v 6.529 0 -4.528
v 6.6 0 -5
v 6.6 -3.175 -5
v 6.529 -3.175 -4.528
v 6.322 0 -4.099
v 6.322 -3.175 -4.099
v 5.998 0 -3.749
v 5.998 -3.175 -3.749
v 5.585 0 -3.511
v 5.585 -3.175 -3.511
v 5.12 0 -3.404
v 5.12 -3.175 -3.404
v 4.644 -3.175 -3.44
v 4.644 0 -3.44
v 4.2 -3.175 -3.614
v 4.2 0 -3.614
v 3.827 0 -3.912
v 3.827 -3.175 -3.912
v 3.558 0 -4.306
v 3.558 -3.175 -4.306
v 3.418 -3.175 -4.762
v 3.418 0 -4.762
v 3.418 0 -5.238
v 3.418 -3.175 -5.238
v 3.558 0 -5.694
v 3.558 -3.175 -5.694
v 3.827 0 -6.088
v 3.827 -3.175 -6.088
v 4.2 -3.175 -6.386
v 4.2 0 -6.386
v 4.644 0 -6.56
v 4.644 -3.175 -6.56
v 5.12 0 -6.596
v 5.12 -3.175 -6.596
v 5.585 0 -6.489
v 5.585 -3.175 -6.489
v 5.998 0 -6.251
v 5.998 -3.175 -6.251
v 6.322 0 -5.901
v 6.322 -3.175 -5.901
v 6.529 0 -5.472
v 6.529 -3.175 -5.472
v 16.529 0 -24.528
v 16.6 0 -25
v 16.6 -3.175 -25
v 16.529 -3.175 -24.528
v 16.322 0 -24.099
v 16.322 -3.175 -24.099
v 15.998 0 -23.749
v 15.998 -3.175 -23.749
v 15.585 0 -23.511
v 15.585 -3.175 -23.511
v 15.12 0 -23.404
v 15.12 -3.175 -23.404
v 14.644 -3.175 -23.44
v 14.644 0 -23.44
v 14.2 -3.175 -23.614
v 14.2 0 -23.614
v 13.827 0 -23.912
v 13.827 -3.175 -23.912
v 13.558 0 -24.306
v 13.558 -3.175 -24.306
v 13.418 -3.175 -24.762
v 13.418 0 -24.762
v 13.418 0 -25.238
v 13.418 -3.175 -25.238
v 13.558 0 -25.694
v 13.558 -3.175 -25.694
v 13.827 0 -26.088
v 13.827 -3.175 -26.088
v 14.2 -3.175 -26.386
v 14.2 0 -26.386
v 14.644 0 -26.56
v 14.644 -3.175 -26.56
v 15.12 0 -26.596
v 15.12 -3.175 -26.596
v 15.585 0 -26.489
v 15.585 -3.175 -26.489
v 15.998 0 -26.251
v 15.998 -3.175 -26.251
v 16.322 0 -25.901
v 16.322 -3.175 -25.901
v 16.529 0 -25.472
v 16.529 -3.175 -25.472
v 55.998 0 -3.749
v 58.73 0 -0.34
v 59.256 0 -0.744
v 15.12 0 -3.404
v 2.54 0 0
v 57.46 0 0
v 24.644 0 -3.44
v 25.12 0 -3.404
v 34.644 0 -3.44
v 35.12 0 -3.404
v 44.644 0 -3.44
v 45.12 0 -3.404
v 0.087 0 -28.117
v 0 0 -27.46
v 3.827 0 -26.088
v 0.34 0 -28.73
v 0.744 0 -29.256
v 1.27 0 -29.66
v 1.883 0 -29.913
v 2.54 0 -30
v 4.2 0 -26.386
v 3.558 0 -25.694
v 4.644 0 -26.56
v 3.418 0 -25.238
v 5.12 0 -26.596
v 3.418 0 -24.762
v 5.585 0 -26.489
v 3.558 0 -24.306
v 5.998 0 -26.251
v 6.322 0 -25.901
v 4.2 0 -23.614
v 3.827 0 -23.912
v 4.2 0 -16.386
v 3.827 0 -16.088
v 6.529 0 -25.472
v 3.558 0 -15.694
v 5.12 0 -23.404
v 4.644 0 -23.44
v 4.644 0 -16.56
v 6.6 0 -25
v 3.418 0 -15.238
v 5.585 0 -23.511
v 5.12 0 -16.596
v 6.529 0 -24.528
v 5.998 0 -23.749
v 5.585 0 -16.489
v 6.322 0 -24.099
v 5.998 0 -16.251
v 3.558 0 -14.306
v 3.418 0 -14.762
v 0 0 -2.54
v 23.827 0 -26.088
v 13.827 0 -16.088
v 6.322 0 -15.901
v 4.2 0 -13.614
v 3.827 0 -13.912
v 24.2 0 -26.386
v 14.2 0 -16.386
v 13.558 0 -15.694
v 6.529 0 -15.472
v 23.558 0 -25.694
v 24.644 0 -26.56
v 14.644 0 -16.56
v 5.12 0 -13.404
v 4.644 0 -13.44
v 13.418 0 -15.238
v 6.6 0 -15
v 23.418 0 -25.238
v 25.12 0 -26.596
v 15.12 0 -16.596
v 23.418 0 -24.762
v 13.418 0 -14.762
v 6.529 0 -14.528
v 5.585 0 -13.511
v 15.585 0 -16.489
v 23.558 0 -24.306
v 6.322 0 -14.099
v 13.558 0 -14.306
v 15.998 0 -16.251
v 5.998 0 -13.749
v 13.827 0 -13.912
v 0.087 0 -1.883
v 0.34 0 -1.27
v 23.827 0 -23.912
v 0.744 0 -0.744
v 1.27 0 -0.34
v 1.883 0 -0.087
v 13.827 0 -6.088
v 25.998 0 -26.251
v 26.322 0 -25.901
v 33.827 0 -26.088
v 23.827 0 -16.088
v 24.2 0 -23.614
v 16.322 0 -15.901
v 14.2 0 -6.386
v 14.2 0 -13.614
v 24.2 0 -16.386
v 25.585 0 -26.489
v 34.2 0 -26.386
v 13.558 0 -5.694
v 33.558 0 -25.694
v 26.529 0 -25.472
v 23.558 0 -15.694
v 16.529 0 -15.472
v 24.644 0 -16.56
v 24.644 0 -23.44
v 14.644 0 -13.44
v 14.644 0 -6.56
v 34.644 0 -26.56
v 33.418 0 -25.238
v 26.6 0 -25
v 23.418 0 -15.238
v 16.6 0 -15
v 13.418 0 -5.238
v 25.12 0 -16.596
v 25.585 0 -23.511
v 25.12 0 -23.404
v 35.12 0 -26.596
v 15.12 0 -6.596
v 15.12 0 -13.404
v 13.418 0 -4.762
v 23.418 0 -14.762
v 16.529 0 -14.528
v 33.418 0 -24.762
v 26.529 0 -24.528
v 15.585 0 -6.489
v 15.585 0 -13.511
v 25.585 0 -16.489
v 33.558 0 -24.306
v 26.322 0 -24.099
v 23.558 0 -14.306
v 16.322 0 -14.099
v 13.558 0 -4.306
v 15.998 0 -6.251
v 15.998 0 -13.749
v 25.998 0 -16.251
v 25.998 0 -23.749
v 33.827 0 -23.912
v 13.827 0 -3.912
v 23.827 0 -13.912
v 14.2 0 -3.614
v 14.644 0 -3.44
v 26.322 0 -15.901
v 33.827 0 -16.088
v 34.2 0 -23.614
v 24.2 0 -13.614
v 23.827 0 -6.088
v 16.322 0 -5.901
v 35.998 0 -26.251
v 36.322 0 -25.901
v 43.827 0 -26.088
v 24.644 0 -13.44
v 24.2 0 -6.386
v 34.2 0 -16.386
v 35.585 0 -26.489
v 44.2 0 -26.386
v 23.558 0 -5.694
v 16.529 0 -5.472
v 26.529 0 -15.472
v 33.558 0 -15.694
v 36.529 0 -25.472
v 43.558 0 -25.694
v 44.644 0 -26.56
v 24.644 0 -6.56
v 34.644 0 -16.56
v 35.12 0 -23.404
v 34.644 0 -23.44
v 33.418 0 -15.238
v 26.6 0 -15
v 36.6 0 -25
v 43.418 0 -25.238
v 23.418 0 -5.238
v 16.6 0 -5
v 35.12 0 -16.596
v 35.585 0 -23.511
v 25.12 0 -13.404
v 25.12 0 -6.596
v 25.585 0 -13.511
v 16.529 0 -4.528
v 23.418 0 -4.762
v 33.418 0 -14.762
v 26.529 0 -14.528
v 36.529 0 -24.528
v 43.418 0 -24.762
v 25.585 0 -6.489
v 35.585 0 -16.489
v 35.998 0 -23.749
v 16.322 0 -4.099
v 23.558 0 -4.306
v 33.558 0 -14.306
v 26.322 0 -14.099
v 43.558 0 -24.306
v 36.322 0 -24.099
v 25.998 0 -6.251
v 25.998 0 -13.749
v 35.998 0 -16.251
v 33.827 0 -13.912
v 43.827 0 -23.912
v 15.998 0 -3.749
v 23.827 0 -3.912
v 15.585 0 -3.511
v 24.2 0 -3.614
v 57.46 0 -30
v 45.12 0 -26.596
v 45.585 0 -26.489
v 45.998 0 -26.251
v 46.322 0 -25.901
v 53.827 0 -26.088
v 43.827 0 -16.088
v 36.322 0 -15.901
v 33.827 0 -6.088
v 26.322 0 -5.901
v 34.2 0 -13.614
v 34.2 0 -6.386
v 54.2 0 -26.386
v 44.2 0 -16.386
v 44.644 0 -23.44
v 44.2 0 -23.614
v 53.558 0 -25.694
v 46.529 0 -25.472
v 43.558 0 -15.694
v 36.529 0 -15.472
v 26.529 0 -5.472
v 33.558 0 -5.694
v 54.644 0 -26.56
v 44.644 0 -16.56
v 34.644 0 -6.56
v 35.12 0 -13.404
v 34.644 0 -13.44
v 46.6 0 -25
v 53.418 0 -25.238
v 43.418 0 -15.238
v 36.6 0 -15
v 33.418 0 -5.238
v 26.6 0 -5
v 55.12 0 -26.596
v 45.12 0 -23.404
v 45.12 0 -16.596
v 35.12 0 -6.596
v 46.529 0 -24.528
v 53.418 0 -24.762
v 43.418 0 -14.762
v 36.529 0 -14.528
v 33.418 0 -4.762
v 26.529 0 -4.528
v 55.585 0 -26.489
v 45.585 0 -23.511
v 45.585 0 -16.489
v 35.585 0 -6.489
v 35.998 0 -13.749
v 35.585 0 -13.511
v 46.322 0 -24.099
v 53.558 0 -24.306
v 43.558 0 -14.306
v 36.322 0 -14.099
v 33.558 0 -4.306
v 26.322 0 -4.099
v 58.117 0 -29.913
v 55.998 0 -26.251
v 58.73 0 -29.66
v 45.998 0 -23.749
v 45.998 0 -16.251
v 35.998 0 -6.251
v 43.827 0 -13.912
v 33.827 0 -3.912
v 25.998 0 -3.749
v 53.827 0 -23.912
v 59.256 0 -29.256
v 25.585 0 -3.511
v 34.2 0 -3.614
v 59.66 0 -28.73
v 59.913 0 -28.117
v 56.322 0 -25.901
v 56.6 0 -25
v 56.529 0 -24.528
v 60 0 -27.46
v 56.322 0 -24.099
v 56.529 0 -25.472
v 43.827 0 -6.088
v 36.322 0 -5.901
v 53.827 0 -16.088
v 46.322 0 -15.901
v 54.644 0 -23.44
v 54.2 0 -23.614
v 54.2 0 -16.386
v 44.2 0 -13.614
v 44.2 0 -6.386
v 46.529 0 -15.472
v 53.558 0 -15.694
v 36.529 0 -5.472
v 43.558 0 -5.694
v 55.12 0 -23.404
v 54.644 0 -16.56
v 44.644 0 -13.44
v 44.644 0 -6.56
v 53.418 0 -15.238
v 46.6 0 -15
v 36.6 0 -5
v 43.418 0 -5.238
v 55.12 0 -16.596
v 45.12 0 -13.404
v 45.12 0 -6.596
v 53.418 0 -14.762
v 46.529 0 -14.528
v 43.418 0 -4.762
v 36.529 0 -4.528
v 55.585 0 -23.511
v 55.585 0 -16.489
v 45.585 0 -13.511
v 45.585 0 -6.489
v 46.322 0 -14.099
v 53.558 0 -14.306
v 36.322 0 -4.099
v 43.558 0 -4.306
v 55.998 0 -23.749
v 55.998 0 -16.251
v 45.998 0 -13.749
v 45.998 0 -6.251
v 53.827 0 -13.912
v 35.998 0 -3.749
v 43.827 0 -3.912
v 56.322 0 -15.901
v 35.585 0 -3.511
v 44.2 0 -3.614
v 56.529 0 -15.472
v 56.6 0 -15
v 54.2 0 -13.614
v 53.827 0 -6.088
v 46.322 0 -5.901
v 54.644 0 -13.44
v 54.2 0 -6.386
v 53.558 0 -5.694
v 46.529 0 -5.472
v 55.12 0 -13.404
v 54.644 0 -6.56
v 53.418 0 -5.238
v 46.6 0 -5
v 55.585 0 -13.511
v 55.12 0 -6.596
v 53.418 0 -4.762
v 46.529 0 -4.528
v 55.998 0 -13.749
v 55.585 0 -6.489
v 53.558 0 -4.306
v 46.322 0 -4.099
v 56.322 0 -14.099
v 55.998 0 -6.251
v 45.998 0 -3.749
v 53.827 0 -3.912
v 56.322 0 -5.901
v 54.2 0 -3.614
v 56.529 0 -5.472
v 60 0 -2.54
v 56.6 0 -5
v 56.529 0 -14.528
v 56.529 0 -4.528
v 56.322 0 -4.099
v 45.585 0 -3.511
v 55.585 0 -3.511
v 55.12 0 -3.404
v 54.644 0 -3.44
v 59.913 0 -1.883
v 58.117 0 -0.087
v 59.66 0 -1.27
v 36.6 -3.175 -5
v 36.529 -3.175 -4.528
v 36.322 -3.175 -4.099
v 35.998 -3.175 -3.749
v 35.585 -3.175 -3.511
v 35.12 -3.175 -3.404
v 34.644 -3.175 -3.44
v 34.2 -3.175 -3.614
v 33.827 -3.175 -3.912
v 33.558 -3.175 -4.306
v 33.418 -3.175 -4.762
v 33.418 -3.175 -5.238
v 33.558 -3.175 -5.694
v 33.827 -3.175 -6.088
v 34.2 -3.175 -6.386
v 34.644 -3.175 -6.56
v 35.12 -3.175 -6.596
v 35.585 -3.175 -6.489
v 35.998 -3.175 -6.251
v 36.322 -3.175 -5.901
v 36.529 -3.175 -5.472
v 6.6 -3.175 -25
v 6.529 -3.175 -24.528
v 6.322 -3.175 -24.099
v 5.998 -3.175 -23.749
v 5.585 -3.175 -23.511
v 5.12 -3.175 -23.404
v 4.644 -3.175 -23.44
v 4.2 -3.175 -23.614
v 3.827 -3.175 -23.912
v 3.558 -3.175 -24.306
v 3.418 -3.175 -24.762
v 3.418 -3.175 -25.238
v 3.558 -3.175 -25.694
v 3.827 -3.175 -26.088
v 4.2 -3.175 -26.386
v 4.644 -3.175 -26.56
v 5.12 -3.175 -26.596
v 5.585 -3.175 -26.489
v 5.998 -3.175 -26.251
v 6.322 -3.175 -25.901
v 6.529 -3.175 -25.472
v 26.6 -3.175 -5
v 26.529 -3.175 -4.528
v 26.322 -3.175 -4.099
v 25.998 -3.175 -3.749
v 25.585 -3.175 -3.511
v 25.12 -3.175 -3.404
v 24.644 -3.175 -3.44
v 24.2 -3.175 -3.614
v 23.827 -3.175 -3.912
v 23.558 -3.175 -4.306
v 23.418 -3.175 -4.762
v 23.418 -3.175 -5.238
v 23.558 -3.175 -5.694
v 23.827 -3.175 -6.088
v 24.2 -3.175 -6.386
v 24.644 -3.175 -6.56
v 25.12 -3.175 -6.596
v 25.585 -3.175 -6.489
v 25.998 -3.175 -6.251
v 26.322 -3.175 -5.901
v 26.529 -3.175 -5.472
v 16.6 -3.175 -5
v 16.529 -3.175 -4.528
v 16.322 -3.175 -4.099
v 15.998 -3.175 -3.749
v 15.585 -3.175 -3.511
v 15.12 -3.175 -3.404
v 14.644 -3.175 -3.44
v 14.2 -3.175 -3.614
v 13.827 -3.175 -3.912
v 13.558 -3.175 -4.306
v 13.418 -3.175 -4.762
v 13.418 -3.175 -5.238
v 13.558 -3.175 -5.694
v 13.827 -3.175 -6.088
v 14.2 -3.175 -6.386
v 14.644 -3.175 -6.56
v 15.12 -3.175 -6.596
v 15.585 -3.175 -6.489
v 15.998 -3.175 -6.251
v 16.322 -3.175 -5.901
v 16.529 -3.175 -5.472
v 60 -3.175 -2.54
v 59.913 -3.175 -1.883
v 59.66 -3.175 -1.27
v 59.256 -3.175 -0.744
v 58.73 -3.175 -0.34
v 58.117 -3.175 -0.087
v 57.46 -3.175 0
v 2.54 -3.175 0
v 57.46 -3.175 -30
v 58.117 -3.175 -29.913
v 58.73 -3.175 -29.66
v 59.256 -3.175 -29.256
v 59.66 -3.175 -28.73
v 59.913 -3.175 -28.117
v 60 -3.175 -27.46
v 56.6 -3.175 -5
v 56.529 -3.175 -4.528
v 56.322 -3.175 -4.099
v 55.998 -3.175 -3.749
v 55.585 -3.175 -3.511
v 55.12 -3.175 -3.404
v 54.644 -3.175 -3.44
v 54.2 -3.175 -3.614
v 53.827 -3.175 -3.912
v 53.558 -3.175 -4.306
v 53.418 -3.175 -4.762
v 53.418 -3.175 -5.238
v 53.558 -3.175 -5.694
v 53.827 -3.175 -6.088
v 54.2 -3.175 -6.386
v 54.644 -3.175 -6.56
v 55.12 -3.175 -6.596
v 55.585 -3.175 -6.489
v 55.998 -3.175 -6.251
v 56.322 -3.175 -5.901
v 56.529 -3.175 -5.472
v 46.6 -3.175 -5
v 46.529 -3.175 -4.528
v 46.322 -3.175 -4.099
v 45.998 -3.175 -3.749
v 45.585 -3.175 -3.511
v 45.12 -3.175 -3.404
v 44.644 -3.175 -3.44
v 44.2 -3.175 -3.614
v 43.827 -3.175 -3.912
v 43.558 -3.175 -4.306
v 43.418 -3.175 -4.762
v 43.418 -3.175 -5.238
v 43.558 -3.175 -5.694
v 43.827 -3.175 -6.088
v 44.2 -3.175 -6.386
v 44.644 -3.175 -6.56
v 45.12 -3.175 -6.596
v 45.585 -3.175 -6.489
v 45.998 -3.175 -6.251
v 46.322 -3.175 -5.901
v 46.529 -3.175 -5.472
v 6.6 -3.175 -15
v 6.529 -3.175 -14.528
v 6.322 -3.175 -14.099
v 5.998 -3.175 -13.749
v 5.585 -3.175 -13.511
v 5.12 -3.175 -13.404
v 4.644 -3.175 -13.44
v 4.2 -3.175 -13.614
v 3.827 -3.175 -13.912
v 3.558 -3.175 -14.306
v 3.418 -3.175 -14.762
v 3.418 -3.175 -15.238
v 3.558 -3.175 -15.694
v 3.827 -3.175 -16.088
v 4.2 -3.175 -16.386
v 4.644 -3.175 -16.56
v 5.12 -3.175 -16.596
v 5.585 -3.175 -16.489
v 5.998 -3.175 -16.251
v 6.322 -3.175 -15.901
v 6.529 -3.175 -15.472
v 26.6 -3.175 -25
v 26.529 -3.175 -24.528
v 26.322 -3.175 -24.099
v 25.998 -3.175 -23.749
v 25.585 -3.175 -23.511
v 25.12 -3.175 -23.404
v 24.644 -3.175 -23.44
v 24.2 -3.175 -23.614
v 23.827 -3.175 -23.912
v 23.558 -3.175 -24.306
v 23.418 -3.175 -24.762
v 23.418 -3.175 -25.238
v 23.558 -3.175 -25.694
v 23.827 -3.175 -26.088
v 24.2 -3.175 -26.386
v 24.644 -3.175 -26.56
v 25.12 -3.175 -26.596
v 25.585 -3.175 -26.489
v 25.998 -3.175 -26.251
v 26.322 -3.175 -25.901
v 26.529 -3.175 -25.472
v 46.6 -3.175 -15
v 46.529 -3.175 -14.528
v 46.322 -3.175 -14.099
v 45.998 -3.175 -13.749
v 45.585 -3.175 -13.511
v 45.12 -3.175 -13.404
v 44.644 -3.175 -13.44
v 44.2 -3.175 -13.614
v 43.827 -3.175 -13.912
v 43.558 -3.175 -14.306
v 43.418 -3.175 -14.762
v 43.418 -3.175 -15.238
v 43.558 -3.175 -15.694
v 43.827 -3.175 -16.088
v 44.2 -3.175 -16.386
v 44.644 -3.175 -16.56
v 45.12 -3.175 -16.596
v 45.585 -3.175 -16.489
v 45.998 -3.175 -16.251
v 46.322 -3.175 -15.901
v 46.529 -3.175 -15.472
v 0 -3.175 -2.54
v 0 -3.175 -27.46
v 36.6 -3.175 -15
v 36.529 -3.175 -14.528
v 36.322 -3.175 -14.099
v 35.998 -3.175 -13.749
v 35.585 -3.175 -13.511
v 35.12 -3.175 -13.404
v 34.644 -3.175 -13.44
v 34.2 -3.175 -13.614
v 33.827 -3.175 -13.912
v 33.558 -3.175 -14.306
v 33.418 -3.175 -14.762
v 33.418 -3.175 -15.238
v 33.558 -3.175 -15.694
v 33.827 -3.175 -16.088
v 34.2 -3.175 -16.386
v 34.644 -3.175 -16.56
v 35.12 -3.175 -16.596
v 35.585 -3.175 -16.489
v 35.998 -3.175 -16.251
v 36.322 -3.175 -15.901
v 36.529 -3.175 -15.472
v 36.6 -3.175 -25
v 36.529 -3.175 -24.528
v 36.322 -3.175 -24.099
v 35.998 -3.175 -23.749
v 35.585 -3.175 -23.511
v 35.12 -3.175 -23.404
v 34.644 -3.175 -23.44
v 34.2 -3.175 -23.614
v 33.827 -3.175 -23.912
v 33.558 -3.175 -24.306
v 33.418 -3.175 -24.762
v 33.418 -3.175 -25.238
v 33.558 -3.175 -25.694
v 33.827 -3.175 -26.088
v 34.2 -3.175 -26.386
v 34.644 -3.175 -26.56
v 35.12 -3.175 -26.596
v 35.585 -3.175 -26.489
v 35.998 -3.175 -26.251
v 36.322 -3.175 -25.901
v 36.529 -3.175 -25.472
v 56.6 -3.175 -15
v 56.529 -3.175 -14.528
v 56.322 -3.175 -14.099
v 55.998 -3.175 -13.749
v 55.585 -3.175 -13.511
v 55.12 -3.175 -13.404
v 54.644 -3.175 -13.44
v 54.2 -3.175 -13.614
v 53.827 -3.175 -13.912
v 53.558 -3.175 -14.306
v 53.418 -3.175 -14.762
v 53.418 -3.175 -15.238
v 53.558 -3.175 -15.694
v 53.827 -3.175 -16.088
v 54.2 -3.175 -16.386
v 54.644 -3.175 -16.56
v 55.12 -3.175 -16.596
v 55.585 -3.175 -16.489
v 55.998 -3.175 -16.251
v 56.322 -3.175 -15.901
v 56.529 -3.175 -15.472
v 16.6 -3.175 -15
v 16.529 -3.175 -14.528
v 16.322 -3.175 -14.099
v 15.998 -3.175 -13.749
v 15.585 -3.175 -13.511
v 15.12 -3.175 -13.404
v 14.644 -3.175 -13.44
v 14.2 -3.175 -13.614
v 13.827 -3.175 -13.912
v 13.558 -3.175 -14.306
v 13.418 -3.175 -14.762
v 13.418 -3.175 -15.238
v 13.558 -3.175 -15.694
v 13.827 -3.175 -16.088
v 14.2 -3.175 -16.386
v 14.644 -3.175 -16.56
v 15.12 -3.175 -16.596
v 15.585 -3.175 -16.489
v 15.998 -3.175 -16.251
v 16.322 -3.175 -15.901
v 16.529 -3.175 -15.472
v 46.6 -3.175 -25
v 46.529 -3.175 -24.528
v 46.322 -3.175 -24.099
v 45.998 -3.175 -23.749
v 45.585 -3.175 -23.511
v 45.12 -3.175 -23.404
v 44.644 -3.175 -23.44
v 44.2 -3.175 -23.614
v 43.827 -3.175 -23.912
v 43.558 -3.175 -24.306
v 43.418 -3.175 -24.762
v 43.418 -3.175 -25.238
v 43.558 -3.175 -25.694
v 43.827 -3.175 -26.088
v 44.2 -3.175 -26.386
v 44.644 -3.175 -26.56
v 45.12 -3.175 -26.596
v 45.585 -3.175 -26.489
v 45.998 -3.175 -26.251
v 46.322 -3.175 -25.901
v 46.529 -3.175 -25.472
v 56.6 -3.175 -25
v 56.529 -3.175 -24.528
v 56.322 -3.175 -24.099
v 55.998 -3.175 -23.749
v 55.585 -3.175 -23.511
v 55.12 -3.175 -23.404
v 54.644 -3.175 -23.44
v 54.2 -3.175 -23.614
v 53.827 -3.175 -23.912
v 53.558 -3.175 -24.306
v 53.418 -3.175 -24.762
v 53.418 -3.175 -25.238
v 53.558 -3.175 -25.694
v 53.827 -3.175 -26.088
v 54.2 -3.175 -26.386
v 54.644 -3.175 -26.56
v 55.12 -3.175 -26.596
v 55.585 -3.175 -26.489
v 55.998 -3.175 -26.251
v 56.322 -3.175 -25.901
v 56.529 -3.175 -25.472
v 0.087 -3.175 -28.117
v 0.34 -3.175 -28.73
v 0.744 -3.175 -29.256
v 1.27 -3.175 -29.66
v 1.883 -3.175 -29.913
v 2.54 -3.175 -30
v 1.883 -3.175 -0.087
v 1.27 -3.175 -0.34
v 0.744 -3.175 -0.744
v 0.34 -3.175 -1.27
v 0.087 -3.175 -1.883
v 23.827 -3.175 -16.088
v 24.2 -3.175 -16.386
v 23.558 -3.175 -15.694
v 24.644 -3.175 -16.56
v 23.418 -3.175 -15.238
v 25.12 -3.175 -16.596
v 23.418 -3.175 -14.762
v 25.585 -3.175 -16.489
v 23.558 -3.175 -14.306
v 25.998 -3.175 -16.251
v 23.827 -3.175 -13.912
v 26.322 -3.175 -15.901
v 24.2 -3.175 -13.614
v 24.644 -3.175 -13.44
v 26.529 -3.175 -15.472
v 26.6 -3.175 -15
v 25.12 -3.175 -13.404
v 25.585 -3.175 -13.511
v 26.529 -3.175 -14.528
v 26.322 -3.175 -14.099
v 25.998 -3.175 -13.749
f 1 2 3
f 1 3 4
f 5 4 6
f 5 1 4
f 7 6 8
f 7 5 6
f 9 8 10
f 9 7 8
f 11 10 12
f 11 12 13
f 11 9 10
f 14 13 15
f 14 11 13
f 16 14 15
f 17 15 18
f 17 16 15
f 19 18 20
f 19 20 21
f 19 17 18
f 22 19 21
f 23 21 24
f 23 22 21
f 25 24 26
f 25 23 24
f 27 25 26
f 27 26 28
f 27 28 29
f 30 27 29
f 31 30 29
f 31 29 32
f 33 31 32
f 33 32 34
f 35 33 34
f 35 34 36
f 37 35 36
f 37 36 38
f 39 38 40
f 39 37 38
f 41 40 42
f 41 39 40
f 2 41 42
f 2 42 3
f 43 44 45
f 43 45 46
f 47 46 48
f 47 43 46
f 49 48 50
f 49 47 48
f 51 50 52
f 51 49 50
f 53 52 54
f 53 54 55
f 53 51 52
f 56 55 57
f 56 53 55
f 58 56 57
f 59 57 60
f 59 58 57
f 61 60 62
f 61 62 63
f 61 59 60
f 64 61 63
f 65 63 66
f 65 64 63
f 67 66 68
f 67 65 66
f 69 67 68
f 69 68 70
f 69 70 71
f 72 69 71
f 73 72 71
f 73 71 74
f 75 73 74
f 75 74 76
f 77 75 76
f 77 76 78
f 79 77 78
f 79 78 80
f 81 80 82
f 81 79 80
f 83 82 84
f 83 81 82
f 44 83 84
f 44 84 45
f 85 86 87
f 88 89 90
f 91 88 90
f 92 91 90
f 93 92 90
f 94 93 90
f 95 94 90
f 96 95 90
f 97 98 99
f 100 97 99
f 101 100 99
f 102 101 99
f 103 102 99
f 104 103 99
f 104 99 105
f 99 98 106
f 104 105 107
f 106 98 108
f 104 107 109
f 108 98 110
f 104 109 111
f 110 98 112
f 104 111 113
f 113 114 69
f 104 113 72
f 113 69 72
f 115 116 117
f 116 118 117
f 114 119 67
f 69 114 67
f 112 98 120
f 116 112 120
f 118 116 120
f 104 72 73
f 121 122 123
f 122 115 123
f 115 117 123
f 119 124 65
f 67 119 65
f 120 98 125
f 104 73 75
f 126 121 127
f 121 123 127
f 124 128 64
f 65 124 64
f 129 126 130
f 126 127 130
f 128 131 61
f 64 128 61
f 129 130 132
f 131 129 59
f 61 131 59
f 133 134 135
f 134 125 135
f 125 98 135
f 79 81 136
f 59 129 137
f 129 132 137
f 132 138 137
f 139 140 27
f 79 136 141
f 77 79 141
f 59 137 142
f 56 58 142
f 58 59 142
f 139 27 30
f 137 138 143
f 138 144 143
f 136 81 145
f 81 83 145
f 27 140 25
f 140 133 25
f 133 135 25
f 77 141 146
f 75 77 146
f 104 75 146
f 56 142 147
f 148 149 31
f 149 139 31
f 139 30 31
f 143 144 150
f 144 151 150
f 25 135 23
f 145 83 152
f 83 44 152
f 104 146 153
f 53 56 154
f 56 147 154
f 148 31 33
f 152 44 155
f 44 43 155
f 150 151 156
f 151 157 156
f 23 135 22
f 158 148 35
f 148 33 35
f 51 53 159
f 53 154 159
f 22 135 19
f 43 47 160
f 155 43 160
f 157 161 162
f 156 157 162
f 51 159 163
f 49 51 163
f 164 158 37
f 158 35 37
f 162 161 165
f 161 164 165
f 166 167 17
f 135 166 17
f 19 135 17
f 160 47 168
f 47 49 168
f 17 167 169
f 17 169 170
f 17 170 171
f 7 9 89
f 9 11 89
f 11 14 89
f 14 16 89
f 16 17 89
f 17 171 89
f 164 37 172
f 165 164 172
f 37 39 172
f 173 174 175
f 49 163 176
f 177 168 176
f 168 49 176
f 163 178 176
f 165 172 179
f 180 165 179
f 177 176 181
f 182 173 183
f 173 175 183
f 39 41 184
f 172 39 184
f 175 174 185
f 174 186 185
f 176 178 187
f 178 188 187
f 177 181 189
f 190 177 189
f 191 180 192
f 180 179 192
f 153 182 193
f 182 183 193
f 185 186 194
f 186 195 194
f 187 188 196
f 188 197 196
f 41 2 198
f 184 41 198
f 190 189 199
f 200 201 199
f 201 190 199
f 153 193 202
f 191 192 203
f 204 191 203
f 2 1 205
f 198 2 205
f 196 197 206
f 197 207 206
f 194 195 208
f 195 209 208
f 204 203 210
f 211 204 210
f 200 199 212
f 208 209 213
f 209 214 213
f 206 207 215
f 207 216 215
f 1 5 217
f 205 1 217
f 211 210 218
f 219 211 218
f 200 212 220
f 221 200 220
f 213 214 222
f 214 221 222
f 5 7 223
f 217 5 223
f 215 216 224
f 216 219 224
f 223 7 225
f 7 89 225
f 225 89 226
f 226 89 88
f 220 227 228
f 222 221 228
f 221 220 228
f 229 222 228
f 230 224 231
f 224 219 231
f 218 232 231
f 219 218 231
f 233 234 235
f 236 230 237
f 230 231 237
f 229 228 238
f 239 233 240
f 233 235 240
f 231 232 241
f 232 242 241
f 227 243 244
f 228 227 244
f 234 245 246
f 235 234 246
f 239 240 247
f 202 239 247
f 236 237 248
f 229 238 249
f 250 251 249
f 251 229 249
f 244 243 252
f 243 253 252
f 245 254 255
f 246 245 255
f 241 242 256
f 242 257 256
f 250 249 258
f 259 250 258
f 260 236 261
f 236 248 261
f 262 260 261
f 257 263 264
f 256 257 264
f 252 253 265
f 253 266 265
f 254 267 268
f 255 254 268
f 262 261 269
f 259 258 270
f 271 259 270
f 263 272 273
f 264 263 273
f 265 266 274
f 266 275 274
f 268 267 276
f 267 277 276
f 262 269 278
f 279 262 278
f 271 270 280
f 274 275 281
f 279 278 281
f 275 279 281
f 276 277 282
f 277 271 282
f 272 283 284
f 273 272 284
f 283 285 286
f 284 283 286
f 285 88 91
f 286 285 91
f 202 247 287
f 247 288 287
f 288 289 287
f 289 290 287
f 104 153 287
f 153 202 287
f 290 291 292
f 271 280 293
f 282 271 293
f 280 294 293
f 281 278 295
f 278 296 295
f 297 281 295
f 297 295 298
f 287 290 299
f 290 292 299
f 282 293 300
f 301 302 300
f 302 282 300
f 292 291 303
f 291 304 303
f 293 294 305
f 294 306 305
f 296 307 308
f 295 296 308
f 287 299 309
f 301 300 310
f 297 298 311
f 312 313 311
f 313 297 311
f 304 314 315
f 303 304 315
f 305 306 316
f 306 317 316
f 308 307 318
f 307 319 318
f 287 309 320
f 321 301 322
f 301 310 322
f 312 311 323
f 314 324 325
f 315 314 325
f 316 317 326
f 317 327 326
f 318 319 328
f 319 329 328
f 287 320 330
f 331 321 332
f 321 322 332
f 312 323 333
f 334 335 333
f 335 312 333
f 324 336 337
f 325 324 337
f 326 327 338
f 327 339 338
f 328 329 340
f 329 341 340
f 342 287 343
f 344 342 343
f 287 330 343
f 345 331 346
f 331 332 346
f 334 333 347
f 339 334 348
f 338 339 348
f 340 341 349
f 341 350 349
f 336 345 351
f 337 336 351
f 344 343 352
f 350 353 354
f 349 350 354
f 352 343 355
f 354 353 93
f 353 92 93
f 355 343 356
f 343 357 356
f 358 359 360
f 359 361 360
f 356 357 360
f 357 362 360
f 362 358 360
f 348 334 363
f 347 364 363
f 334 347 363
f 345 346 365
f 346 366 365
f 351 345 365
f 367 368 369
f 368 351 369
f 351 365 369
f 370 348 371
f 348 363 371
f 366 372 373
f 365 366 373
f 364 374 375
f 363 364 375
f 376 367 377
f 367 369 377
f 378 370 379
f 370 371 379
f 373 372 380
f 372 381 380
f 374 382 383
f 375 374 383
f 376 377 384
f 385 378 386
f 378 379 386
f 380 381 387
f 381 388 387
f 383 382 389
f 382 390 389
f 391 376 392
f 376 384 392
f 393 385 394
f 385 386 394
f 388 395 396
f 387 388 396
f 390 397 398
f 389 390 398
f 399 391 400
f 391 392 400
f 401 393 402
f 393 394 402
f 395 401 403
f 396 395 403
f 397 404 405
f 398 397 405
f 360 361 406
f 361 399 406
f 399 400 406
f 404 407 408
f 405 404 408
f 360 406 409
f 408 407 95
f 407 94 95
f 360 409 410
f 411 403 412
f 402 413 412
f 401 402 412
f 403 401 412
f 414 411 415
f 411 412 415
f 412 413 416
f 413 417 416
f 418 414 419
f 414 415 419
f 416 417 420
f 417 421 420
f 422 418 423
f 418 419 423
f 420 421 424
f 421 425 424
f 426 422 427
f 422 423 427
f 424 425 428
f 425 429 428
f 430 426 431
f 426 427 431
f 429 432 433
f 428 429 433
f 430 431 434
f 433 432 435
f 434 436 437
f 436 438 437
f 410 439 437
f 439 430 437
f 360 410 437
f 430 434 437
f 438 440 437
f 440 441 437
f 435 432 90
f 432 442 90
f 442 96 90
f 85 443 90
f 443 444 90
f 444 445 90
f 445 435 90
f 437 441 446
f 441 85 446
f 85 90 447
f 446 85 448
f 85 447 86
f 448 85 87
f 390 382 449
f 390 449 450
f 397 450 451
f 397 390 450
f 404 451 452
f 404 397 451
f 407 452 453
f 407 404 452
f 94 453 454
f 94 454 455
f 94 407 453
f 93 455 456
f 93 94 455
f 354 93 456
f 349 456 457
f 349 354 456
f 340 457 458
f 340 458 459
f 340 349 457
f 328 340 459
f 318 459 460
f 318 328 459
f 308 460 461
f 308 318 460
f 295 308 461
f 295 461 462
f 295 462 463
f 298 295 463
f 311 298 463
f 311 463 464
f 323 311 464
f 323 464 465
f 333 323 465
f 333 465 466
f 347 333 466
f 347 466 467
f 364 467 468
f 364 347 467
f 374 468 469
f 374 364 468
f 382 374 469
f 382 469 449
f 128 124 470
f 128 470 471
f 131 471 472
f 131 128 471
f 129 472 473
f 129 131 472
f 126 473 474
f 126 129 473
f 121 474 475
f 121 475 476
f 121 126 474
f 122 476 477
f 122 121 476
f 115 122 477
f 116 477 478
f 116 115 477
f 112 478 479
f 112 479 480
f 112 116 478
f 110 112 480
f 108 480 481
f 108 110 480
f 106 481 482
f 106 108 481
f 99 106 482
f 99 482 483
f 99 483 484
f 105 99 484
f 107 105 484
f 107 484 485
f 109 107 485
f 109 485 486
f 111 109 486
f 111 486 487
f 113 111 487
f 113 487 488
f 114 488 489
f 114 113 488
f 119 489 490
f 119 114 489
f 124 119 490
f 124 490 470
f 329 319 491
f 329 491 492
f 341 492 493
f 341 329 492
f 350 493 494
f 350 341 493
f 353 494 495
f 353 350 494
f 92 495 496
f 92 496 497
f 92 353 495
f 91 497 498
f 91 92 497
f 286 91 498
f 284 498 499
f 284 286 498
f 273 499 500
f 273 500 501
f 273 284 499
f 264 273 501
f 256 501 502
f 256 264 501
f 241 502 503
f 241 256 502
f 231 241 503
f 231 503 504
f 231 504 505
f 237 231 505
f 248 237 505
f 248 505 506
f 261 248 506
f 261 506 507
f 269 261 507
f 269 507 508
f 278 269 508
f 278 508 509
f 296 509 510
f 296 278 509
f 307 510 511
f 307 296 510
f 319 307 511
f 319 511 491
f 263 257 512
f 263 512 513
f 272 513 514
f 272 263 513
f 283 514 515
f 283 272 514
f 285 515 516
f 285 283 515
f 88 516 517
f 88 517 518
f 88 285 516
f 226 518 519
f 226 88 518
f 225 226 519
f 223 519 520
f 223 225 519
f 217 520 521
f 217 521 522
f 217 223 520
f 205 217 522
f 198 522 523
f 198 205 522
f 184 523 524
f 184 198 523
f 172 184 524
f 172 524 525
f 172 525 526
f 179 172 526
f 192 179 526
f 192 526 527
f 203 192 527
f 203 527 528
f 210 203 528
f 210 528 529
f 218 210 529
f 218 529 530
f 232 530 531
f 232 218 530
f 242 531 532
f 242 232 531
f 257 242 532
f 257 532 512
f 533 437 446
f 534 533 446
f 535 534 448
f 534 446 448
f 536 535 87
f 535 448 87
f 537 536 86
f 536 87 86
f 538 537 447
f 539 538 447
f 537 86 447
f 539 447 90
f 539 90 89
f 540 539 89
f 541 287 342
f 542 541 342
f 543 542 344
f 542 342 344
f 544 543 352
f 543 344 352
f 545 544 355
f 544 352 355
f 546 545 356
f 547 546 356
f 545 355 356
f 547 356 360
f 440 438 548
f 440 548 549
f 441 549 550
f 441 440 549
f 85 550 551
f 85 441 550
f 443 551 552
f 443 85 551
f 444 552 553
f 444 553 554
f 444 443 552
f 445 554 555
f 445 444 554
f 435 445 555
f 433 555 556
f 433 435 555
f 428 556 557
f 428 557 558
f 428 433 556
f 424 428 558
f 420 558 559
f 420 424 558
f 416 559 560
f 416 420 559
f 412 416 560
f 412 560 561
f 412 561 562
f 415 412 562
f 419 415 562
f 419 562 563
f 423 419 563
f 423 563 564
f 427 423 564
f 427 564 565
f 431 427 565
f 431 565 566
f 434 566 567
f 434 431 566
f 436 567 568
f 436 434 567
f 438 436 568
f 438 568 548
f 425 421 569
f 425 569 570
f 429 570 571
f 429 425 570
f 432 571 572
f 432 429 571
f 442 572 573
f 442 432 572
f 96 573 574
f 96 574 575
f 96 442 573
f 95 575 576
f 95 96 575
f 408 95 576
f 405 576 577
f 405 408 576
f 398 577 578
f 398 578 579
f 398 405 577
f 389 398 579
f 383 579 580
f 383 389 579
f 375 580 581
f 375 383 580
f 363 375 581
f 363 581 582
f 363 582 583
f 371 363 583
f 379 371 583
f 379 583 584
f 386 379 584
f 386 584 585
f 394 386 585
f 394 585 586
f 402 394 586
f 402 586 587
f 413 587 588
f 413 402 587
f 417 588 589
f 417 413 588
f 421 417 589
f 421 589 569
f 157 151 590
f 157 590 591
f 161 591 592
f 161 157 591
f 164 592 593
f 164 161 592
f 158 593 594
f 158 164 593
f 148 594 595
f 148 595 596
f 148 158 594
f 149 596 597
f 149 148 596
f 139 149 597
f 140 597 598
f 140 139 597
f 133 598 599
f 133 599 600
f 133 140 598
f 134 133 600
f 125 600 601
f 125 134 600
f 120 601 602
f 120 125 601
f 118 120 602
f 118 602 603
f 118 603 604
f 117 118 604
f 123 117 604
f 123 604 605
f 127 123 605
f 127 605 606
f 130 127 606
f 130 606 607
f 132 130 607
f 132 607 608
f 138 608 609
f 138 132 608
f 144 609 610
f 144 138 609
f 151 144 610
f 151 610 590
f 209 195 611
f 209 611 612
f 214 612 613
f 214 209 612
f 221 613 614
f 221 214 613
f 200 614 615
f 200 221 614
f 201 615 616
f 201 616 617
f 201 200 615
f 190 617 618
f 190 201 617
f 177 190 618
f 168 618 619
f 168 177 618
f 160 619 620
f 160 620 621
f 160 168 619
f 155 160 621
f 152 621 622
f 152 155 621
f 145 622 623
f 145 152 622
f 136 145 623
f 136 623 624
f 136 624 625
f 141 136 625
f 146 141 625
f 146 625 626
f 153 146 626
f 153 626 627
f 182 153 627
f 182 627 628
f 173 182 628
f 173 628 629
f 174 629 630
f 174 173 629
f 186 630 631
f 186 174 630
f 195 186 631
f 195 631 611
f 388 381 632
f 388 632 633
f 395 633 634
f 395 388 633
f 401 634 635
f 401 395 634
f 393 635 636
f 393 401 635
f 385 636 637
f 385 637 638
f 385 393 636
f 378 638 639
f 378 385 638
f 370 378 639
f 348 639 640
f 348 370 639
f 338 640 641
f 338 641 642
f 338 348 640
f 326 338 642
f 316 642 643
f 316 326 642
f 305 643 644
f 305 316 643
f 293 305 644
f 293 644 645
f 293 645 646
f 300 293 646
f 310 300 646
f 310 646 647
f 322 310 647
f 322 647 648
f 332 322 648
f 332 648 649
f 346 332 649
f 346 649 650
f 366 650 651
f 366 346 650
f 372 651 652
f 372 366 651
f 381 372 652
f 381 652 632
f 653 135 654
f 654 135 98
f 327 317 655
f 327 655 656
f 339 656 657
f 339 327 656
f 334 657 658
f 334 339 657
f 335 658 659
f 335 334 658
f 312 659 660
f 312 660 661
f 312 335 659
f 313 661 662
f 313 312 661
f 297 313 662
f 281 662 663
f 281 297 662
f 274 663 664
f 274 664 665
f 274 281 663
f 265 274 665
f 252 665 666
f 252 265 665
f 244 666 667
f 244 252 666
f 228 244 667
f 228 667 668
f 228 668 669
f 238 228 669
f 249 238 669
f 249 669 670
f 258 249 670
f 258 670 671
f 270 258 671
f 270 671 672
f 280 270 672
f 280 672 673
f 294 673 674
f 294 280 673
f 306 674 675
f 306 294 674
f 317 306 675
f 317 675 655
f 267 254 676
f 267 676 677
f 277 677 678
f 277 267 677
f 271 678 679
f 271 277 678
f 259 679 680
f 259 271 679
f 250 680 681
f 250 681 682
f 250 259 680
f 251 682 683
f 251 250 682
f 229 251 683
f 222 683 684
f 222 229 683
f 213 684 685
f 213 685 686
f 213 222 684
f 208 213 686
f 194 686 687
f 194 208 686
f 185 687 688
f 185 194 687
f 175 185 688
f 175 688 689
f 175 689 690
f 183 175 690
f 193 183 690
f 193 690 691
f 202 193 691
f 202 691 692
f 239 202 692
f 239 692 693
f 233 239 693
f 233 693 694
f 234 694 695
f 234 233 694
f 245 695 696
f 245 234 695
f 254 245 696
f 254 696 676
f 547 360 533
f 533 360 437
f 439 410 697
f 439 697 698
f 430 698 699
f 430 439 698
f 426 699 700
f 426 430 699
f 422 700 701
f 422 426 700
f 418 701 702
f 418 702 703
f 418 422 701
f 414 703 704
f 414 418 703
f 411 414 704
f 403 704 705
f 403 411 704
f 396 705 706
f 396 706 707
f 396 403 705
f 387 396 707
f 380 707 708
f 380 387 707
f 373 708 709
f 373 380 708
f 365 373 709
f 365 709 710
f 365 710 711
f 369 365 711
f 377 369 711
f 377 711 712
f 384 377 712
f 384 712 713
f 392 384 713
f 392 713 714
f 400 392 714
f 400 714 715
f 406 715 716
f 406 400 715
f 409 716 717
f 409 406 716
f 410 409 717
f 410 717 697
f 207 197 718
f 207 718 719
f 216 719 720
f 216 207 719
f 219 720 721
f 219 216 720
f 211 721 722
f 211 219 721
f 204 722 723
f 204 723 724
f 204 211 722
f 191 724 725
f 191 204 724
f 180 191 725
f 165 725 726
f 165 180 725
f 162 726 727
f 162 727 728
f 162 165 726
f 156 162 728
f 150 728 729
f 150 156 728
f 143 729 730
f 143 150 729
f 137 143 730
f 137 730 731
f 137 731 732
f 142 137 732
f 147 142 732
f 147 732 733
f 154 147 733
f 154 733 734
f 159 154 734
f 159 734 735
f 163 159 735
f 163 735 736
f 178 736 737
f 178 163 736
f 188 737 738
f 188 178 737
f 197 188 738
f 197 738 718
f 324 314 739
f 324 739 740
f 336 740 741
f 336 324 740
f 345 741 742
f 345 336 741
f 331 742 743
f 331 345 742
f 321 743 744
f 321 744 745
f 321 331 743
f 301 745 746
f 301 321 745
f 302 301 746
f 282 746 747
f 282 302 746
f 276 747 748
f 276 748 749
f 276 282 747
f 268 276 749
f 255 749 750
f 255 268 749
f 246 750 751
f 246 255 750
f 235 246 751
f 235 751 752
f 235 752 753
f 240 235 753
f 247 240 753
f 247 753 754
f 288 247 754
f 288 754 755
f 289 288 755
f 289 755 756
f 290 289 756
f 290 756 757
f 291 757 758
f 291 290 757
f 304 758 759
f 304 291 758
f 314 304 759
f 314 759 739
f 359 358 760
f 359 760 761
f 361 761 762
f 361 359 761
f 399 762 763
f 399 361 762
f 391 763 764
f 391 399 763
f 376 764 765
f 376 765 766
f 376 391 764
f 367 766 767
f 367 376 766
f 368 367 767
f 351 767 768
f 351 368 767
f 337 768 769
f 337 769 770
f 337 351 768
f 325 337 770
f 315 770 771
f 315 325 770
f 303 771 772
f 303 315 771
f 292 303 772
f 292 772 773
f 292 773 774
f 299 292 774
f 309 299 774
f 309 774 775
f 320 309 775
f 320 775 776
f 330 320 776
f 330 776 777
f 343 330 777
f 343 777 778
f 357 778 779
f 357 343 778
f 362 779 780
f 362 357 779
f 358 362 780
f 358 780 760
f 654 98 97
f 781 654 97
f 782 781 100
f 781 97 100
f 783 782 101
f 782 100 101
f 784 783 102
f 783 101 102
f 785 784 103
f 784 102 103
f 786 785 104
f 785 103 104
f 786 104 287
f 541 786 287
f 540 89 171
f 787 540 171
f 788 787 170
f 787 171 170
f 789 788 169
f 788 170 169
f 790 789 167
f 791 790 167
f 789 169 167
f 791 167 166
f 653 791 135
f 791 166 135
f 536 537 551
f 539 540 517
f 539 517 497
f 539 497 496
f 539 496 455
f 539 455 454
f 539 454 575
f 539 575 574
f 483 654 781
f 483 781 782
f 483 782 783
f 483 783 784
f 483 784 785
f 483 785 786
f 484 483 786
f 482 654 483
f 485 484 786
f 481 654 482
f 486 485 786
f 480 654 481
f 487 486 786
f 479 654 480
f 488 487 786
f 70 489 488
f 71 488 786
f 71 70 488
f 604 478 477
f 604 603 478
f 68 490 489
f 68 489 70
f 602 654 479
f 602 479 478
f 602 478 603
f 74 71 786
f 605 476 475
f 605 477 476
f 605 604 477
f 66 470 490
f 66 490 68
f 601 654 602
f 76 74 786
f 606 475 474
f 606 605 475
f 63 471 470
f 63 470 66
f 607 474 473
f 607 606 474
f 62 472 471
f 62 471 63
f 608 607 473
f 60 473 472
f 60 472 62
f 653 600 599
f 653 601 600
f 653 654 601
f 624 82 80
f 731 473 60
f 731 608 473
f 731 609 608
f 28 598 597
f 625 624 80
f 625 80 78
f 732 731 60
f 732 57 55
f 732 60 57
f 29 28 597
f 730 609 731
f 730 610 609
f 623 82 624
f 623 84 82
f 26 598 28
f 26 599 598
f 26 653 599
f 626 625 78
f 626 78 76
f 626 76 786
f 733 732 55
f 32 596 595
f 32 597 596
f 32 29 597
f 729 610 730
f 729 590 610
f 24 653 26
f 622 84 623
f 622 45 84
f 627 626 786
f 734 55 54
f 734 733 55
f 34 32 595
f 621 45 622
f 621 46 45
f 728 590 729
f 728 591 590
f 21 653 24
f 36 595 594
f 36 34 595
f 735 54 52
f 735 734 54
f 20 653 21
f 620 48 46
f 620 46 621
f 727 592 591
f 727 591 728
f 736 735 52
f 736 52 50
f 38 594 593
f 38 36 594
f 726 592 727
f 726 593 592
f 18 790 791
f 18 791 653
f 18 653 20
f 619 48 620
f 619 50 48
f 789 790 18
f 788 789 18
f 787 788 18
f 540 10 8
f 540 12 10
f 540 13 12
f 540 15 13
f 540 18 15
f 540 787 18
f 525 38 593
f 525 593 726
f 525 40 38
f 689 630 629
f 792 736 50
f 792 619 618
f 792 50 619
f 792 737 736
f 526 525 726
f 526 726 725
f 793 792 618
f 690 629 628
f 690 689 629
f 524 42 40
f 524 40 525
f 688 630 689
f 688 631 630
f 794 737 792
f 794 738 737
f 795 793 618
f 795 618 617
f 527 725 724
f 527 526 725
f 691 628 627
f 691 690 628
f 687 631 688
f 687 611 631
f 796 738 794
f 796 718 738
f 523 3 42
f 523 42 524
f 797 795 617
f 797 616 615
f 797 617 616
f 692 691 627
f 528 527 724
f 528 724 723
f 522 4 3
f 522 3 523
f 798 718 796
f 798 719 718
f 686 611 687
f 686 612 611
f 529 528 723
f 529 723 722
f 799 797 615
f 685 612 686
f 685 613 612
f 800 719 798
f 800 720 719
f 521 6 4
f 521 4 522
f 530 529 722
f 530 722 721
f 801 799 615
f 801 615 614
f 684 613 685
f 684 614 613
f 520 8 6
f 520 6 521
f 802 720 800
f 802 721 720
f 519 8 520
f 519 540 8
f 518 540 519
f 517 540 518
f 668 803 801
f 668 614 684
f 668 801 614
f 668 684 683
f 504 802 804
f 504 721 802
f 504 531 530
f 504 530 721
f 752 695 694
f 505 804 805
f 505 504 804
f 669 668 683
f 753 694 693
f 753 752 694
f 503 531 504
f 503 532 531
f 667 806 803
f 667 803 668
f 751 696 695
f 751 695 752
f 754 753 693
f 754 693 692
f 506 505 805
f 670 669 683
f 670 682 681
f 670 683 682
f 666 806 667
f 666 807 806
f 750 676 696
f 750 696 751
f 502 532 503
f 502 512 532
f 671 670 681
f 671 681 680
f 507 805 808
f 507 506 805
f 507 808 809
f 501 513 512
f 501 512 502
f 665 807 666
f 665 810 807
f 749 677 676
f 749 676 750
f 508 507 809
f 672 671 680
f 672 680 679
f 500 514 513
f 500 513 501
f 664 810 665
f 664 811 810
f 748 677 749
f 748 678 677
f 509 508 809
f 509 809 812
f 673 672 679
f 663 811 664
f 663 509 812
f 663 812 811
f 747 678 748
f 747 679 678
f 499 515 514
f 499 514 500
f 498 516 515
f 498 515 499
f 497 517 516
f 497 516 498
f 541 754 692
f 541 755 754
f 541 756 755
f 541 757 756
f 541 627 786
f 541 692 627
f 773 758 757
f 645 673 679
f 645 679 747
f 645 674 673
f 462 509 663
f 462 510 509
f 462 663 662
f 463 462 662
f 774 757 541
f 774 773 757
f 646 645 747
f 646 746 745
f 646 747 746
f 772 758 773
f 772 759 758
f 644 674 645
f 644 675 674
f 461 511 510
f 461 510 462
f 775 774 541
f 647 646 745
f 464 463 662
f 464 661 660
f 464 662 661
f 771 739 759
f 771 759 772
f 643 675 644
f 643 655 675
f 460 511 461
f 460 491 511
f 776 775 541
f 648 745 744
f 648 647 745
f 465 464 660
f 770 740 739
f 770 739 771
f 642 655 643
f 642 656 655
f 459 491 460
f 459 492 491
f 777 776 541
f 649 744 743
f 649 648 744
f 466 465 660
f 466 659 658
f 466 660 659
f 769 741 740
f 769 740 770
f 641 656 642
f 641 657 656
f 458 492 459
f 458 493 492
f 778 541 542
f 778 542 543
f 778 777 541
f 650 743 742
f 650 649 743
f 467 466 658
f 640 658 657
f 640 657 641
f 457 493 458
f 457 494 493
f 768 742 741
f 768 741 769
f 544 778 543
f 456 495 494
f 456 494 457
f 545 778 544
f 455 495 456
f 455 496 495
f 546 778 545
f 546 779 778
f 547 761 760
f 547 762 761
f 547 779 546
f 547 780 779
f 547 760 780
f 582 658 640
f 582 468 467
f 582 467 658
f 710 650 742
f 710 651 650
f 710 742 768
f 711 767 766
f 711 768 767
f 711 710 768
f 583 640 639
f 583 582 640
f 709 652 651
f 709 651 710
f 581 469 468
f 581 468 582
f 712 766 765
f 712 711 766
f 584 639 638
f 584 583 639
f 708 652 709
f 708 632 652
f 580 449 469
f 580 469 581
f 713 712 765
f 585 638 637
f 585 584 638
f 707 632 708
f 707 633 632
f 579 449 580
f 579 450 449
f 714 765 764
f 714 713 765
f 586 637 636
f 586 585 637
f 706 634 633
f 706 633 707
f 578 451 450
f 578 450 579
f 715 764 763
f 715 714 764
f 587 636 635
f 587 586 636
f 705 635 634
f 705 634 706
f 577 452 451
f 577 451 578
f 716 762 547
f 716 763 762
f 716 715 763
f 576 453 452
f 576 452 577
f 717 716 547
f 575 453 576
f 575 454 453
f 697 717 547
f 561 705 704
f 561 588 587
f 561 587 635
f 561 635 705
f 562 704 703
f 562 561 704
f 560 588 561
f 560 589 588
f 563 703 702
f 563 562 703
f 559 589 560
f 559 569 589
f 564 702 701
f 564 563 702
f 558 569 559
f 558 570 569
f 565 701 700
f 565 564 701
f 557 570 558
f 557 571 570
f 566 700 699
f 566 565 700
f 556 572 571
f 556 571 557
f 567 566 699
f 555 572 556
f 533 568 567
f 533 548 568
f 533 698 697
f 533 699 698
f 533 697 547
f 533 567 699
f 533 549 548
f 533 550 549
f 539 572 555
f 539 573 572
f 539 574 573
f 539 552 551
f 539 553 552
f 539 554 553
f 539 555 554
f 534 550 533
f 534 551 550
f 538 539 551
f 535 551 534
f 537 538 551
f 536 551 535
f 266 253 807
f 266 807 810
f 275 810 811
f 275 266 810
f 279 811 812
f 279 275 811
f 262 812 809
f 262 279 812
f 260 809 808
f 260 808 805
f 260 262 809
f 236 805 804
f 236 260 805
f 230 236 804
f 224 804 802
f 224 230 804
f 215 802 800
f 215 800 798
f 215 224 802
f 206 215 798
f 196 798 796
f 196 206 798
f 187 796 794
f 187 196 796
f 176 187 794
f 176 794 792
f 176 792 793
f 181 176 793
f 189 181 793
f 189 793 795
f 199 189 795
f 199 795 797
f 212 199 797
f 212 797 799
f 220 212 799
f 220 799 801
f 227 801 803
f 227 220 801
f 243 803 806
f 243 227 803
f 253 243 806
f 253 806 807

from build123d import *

# Parameters (mm, degrees)
F0_R     = 1.6
F1_DEPTH = 3.175


# Not quite as in the source:
# - a length typed as a fraction of an inch, garbled in the dataset ("3 / 203.2 mm" for 3/8 in), is restored


with BuildPart() as f1:
    # F0 (on Front) → F1 (new body)
    with BuildSketch(Plane.XZ):
        with BuildLine():
            Line((57.46, 0), (2.54, 0))
            ThreePointArc((2.54, 0), (0.7439487758, -0.7439487758), (0, -2.54))
            Line((0, -2.54), (0, -27.46))
            ThreePointArc((0, -27.46), (0.7439487758, -29.2560512242), (2.54, -30))
            Line((2.54, -30), (57.46, -30))
            ThreePointArc((57.46, -30), (59.2560512242, -29.2560512242), (60, -27.46))
            Line((60, -27.46), (60, -2.54))
            ThreePointArc((60, -2.54), (59.2560512242, -0.7439487758), (57.46, 0))
        make_face()
        with Locations((5, -25)):
            Circle(F0_R, mode=Mode.SUBTRACT)
        with Locations((15, -25)):
            Circle(F0_R, mode=Mode.SUBTRACT)
        with Locations((25, -25)):
            Circle(F0_R, mode=Mode.SUBTRACT)
        with Locations((35, -25)):
            Circle(F0_R, mode=Mode.SUBTRACT)
        with Locations((45, -25)):
            Circle(F0_R, mode=Mode.SUBTRACT)
        with Locations((55, -25)):
            Circle(F0_R, mode=Mode.SUBTRACT)
        with Locations((5, -15)):
            Circle(F0_R, mode=Mode.SUBTRACT)
        with Locations((15, -15)):
            Circle(F0_R, mode=Mode.SUBTRACT)
        with Locations((25, -15)):
            Circle(F0_R, mode=Mode.SUBTRACT)
        with Locations((5, -5)):
            Circle(F0_R, mode=Mode.SUBTRACT)
        with Locations((15, -5)):
            Circle(F0_R, mode=Mode.SUBTRACT)
        with Locations((25, -5)):
            Circle(F0_R, mode=Mode.SUBTRACT)
        with Locations((35, -15)):
            Circle(F0_R, mode=Mode.SUBTRACT)
        with Locations((45, -15)):
            Circle(F0_R, mode=Mode.SUBTRACT)
        with Locations((55, -15)):
            Circle(F0_R, mode=Mode.SUBTRACT)
        with Locations((35, -5)):
            Circle(F0_R, mode=Mode.SUBTRACT)
        with Locations((45, -5)):
            Circle(F0_R, mode=Mode.SUBTRACT)
        with Locations((55, -5)):
            Circle(F0_R, mode=Mode.SUBTRACT)
    extrude(amount=F1_DEPTH)


solid = f1.part
